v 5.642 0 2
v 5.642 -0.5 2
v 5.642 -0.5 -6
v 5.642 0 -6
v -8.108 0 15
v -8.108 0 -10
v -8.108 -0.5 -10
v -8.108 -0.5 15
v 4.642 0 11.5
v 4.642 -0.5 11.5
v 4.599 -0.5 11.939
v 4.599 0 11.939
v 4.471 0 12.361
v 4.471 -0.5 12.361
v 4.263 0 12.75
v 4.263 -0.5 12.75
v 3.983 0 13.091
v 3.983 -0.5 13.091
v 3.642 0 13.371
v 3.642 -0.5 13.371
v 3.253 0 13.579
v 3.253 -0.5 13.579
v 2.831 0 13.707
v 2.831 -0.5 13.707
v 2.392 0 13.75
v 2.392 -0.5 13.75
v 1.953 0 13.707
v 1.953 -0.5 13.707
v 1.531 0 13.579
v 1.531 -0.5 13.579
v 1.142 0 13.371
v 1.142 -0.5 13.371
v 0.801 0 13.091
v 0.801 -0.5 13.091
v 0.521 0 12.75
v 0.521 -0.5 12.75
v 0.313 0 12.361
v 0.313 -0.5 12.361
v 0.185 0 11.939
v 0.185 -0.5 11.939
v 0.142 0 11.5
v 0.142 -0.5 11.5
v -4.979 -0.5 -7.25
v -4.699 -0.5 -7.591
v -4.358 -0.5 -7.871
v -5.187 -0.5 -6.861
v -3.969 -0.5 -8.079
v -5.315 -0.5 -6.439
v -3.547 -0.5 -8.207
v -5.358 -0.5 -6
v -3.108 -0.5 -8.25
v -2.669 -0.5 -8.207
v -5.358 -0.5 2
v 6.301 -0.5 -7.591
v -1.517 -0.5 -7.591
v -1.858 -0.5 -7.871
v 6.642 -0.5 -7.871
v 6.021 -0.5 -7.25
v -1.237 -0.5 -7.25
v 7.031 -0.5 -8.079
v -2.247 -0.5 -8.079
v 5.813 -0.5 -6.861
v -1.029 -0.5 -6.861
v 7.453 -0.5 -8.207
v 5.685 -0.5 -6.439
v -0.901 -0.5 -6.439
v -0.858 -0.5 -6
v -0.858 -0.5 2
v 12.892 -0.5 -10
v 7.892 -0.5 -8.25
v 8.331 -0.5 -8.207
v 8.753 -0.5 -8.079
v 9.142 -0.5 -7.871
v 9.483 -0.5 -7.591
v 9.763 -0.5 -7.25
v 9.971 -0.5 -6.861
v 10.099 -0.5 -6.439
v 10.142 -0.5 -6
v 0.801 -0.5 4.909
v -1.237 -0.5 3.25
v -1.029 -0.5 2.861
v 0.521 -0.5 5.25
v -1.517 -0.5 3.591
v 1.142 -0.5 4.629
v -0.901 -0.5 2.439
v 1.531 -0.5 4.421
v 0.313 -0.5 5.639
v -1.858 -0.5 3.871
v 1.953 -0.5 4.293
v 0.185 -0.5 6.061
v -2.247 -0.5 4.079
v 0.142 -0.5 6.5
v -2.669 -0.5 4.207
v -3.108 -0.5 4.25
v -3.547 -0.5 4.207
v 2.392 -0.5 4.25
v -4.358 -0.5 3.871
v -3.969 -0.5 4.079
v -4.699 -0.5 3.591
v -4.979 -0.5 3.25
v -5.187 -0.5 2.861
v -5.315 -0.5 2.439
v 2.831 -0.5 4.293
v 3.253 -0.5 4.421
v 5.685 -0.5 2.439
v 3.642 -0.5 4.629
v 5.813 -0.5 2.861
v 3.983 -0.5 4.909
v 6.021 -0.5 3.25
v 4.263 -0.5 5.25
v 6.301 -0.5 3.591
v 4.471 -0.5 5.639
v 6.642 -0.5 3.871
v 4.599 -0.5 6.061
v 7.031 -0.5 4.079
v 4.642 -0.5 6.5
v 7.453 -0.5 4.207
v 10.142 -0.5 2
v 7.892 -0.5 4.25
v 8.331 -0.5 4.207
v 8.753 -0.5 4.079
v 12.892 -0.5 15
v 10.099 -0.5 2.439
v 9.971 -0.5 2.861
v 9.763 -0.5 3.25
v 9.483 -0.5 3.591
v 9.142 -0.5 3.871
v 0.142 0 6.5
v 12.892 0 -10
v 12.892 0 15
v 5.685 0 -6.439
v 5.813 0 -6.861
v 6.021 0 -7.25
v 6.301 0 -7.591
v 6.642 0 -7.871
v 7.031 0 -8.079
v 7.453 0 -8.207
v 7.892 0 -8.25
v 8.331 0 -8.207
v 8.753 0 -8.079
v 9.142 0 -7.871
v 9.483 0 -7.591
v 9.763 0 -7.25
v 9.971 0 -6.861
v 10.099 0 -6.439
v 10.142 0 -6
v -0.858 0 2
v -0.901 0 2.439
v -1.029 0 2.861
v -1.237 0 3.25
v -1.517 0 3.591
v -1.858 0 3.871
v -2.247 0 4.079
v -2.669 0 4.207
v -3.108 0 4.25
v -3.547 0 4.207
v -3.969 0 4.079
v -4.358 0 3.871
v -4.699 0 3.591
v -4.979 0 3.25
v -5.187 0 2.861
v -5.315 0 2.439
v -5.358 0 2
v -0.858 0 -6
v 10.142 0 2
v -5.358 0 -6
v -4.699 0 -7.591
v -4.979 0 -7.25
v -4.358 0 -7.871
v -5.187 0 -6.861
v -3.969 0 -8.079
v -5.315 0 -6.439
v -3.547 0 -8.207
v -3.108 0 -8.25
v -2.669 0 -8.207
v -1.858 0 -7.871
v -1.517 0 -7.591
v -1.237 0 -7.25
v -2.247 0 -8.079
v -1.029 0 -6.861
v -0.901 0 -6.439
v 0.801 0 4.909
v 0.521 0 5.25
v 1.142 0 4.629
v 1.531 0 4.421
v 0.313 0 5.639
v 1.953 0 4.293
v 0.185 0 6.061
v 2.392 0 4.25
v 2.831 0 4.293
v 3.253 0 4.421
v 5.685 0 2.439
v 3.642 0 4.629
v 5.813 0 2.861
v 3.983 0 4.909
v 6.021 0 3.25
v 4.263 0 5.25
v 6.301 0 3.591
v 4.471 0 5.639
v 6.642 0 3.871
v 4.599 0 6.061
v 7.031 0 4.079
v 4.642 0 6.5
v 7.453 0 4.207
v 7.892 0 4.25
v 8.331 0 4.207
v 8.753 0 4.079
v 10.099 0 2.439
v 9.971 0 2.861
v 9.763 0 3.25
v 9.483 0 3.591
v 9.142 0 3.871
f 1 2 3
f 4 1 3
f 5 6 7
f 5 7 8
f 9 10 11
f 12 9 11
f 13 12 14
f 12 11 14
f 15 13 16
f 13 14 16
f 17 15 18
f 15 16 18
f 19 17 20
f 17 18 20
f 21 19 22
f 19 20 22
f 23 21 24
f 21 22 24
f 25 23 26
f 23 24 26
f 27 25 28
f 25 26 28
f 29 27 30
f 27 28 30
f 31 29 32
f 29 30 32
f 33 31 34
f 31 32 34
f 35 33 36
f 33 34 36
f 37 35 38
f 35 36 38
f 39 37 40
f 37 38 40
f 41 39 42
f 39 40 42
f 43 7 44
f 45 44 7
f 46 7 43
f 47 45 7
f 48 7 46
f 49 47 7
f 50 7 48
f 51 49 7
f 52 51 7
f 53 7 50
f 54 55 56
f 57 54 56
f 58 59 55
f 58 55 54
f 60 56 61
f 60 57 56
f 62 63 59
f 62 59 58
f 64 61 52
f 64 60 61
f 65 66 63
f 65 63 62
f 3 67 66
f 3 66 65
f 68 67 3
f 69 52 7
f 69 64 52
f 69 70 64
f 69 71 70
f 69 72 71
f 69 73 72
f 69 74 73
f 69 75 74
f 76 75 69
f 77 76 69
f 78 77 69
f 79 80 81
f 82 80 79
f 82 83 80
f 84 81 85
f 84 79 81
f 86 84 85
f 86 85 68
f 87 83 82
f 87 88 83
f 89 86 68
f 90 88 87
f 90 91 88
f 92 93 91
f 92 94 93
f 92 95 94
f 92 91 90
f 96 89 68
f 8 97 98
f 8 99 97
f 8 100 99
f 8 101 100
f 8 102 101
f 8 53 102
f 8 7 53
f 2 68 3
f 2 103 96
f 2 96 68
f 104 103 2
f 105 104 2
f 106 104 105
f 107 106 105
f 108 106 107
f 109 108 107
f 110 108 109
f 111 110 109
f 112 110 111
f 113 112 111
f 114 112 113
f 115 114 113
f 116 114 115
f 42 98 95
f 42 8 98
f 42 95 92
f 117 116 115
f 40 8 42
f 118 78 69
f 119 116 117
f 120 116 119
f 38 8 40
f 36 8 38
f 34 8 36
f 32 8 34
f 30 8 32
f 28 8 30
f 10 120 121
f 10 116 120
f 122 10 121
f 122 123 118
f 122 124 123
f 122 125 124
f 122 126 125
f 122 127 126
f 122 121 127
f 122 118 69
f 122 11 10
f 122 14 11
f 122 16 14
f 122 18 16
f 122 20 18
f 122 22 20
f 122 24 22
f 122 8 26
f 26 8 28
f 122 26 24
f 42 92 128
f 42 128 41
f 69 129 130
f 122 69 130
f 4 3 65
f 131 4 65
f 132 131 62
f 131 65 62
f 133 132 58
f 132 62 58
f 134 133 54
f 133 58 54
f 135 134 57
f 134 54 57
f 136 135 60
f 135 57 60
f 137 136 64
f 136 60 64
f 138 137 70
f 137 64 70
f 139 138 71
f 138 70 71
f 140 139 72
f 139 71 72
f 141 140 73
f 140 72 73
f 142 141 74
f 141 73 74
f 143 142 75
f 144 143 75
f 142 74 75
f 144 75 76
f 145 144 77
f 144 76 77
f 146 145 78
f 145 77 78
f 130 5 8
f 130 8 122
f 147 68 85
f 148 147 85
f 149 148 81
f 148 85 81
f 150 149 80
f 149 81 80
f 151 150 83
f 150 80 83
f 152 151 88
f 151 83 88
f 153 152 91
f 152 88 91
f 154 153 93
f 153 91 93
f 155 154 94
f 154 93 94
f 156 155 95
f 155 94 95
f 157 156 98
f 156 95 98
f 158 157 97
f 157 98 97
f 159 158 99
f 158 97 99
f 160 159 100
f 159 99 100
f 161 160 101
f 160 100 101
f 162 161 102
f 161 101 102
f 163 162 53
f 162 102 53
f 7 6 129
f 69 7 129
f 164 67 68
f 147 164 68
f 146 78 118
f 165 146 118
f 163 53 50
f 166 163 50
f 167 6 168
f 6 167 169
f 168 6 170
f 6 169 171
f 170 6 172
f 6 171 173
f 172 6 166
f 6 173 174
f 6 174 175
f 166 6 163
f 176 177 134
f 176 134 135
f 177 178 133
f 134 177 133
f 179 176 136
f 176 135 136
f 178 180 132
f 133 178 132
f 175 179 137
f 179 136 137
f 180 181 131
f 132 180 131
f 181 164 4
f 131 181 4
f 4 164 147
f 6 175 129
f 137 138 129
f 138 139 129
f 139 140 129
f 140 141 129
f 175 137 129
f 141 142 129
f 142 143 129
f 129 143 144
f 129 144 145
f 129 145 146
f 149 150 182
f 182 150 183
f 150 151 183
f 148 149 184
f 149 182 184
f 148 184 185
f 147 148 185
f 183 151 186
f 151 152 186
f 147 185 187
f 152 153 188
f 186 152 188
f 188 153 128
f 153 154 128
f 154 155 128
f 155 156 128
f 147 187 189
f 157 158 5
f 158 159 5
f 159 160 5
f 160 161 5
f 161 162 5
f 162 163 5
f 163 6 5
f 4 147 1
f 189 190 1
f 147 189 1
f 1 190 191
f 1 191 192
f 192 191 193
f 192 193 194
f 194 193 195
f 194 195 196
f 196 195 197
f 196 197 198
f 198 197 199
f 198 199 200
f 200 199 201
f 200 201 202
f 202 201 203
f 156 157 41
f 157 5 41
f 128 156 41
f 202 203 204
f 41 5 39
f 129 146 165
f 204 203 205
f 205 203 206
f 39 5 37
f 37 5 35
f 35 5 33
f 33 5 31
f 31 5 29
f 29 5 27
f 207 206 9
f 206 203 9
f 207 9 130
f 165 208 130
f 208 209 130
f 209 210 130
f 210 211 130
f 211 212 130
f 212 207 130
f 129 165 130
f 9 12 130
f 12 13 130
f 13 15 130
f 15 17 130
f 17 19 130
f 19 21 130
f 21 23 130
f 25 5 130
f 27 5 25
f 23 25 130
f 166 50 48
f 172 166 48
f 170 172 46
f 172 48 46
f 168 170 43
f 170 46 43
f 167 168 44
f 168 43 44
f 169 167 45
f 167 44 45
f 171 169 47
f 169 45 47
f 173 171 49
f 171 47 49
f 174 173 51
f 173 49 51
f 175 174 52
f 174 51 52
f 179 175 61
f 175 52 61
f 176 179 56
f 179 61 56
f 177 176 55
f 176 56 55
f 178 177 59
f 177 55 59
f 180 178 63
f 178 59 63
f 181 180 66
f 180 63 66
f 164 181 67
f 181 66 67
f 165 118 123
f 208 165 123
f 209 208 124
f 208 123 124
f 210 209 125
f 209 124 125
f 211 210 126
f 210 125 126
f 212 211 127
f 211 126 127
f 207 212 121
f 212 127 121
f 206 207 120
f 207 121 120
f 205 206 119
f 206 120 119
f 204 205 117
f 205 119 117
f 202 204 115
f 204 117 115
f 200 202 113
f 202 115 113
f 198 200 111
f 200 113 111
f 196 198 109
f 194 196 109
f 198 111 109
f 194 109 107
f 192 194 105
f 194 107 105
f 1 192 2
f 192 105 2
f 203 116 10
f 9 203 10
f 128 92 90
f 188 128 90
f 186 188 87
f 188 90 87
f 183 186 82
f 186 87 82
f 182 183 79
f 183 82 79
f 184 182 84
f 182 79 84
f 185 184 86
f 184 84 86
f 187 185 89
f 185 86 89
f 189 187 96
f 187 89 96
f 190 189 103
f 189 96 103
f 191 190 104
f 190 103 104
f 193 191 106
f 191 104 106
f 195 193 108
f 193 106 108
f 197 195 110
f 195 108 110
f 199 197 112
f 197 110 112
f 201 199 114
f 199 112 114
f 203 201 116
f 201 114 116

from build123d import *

# Parameters (mm, degrees)
F0_W     = 21
F0_H     = 25
F1_DEPTH = 0.5
F3_DEPTH = 25
F4_W     = 4.5
F4_H     = 5
F5_DEPTH = 25


with BuildPart() as f1:
    # F0 (on Front) → F1 (new body)
    with BuildSketch(Plane.XZ):
        with Locations((2.391892, 2.5)):
            Rectangle(F0_W, F0_H)
    extrude(amount=F1_DEPTH)

    # F2 (on face) → F3 (cut)
    with BuildSketch(Plane.XZ.offset(0.5)):
        with BuildLine():
            ThreePointArc((-5.358108, -6), (-3.10796, -8.25), (-0.858108, -5.999706))
            Line((-0.858108, -5.999706), (-0.858108, 2.000294))
            ThreePointArc((-0.858108, 2.000294), (-3.108255, 4.25), (-5.358108, 2))
            Line((-5.358108, 2), (-5.358108, -6))
        make_face()
        with BuildLine():
            Line((5.641892, 2.000294), (5.641892, -5.999706))
            ThreePointArc((5.641892, -5.999706), (7.891745, -8.25), (10.141892, -6))
            Line((10.141892, -6), (10.141892, 2))
            ThreePointArc((10.141892, 2), (7.89204, 4.25), (5.641892, 2.000294))
        make_face()
    extrude(amount=-F3_DEPTH, mode=Mode.SUBTRACT)

    # F4 (on face) → F5 (cut)
    with BuildSketch(Plane.XZ.offset(0.5)):
        with Locations((2.391892, 9)):
            Rectangle(F4_W, F4_H)
        with BuildLine():
            Line((0.141892, 11.5), (4.641892, 11.5))
            ThreePointArc((4.641892, 11.5), (2.391892, 13.75), (0.141892, 11.5))
        make_face()
        with BuildLine():
            ThreePointArc((0.141892, 6.5), (2.391892, 4.25), (4.641892, 6.5))
            Line((4.641892, 6.5), (0.141892, 6.5))
        make_face()
    extrude(amount=-F5_DEPTH, mode=Mode.SUBTRACT)


solid = f1.part
